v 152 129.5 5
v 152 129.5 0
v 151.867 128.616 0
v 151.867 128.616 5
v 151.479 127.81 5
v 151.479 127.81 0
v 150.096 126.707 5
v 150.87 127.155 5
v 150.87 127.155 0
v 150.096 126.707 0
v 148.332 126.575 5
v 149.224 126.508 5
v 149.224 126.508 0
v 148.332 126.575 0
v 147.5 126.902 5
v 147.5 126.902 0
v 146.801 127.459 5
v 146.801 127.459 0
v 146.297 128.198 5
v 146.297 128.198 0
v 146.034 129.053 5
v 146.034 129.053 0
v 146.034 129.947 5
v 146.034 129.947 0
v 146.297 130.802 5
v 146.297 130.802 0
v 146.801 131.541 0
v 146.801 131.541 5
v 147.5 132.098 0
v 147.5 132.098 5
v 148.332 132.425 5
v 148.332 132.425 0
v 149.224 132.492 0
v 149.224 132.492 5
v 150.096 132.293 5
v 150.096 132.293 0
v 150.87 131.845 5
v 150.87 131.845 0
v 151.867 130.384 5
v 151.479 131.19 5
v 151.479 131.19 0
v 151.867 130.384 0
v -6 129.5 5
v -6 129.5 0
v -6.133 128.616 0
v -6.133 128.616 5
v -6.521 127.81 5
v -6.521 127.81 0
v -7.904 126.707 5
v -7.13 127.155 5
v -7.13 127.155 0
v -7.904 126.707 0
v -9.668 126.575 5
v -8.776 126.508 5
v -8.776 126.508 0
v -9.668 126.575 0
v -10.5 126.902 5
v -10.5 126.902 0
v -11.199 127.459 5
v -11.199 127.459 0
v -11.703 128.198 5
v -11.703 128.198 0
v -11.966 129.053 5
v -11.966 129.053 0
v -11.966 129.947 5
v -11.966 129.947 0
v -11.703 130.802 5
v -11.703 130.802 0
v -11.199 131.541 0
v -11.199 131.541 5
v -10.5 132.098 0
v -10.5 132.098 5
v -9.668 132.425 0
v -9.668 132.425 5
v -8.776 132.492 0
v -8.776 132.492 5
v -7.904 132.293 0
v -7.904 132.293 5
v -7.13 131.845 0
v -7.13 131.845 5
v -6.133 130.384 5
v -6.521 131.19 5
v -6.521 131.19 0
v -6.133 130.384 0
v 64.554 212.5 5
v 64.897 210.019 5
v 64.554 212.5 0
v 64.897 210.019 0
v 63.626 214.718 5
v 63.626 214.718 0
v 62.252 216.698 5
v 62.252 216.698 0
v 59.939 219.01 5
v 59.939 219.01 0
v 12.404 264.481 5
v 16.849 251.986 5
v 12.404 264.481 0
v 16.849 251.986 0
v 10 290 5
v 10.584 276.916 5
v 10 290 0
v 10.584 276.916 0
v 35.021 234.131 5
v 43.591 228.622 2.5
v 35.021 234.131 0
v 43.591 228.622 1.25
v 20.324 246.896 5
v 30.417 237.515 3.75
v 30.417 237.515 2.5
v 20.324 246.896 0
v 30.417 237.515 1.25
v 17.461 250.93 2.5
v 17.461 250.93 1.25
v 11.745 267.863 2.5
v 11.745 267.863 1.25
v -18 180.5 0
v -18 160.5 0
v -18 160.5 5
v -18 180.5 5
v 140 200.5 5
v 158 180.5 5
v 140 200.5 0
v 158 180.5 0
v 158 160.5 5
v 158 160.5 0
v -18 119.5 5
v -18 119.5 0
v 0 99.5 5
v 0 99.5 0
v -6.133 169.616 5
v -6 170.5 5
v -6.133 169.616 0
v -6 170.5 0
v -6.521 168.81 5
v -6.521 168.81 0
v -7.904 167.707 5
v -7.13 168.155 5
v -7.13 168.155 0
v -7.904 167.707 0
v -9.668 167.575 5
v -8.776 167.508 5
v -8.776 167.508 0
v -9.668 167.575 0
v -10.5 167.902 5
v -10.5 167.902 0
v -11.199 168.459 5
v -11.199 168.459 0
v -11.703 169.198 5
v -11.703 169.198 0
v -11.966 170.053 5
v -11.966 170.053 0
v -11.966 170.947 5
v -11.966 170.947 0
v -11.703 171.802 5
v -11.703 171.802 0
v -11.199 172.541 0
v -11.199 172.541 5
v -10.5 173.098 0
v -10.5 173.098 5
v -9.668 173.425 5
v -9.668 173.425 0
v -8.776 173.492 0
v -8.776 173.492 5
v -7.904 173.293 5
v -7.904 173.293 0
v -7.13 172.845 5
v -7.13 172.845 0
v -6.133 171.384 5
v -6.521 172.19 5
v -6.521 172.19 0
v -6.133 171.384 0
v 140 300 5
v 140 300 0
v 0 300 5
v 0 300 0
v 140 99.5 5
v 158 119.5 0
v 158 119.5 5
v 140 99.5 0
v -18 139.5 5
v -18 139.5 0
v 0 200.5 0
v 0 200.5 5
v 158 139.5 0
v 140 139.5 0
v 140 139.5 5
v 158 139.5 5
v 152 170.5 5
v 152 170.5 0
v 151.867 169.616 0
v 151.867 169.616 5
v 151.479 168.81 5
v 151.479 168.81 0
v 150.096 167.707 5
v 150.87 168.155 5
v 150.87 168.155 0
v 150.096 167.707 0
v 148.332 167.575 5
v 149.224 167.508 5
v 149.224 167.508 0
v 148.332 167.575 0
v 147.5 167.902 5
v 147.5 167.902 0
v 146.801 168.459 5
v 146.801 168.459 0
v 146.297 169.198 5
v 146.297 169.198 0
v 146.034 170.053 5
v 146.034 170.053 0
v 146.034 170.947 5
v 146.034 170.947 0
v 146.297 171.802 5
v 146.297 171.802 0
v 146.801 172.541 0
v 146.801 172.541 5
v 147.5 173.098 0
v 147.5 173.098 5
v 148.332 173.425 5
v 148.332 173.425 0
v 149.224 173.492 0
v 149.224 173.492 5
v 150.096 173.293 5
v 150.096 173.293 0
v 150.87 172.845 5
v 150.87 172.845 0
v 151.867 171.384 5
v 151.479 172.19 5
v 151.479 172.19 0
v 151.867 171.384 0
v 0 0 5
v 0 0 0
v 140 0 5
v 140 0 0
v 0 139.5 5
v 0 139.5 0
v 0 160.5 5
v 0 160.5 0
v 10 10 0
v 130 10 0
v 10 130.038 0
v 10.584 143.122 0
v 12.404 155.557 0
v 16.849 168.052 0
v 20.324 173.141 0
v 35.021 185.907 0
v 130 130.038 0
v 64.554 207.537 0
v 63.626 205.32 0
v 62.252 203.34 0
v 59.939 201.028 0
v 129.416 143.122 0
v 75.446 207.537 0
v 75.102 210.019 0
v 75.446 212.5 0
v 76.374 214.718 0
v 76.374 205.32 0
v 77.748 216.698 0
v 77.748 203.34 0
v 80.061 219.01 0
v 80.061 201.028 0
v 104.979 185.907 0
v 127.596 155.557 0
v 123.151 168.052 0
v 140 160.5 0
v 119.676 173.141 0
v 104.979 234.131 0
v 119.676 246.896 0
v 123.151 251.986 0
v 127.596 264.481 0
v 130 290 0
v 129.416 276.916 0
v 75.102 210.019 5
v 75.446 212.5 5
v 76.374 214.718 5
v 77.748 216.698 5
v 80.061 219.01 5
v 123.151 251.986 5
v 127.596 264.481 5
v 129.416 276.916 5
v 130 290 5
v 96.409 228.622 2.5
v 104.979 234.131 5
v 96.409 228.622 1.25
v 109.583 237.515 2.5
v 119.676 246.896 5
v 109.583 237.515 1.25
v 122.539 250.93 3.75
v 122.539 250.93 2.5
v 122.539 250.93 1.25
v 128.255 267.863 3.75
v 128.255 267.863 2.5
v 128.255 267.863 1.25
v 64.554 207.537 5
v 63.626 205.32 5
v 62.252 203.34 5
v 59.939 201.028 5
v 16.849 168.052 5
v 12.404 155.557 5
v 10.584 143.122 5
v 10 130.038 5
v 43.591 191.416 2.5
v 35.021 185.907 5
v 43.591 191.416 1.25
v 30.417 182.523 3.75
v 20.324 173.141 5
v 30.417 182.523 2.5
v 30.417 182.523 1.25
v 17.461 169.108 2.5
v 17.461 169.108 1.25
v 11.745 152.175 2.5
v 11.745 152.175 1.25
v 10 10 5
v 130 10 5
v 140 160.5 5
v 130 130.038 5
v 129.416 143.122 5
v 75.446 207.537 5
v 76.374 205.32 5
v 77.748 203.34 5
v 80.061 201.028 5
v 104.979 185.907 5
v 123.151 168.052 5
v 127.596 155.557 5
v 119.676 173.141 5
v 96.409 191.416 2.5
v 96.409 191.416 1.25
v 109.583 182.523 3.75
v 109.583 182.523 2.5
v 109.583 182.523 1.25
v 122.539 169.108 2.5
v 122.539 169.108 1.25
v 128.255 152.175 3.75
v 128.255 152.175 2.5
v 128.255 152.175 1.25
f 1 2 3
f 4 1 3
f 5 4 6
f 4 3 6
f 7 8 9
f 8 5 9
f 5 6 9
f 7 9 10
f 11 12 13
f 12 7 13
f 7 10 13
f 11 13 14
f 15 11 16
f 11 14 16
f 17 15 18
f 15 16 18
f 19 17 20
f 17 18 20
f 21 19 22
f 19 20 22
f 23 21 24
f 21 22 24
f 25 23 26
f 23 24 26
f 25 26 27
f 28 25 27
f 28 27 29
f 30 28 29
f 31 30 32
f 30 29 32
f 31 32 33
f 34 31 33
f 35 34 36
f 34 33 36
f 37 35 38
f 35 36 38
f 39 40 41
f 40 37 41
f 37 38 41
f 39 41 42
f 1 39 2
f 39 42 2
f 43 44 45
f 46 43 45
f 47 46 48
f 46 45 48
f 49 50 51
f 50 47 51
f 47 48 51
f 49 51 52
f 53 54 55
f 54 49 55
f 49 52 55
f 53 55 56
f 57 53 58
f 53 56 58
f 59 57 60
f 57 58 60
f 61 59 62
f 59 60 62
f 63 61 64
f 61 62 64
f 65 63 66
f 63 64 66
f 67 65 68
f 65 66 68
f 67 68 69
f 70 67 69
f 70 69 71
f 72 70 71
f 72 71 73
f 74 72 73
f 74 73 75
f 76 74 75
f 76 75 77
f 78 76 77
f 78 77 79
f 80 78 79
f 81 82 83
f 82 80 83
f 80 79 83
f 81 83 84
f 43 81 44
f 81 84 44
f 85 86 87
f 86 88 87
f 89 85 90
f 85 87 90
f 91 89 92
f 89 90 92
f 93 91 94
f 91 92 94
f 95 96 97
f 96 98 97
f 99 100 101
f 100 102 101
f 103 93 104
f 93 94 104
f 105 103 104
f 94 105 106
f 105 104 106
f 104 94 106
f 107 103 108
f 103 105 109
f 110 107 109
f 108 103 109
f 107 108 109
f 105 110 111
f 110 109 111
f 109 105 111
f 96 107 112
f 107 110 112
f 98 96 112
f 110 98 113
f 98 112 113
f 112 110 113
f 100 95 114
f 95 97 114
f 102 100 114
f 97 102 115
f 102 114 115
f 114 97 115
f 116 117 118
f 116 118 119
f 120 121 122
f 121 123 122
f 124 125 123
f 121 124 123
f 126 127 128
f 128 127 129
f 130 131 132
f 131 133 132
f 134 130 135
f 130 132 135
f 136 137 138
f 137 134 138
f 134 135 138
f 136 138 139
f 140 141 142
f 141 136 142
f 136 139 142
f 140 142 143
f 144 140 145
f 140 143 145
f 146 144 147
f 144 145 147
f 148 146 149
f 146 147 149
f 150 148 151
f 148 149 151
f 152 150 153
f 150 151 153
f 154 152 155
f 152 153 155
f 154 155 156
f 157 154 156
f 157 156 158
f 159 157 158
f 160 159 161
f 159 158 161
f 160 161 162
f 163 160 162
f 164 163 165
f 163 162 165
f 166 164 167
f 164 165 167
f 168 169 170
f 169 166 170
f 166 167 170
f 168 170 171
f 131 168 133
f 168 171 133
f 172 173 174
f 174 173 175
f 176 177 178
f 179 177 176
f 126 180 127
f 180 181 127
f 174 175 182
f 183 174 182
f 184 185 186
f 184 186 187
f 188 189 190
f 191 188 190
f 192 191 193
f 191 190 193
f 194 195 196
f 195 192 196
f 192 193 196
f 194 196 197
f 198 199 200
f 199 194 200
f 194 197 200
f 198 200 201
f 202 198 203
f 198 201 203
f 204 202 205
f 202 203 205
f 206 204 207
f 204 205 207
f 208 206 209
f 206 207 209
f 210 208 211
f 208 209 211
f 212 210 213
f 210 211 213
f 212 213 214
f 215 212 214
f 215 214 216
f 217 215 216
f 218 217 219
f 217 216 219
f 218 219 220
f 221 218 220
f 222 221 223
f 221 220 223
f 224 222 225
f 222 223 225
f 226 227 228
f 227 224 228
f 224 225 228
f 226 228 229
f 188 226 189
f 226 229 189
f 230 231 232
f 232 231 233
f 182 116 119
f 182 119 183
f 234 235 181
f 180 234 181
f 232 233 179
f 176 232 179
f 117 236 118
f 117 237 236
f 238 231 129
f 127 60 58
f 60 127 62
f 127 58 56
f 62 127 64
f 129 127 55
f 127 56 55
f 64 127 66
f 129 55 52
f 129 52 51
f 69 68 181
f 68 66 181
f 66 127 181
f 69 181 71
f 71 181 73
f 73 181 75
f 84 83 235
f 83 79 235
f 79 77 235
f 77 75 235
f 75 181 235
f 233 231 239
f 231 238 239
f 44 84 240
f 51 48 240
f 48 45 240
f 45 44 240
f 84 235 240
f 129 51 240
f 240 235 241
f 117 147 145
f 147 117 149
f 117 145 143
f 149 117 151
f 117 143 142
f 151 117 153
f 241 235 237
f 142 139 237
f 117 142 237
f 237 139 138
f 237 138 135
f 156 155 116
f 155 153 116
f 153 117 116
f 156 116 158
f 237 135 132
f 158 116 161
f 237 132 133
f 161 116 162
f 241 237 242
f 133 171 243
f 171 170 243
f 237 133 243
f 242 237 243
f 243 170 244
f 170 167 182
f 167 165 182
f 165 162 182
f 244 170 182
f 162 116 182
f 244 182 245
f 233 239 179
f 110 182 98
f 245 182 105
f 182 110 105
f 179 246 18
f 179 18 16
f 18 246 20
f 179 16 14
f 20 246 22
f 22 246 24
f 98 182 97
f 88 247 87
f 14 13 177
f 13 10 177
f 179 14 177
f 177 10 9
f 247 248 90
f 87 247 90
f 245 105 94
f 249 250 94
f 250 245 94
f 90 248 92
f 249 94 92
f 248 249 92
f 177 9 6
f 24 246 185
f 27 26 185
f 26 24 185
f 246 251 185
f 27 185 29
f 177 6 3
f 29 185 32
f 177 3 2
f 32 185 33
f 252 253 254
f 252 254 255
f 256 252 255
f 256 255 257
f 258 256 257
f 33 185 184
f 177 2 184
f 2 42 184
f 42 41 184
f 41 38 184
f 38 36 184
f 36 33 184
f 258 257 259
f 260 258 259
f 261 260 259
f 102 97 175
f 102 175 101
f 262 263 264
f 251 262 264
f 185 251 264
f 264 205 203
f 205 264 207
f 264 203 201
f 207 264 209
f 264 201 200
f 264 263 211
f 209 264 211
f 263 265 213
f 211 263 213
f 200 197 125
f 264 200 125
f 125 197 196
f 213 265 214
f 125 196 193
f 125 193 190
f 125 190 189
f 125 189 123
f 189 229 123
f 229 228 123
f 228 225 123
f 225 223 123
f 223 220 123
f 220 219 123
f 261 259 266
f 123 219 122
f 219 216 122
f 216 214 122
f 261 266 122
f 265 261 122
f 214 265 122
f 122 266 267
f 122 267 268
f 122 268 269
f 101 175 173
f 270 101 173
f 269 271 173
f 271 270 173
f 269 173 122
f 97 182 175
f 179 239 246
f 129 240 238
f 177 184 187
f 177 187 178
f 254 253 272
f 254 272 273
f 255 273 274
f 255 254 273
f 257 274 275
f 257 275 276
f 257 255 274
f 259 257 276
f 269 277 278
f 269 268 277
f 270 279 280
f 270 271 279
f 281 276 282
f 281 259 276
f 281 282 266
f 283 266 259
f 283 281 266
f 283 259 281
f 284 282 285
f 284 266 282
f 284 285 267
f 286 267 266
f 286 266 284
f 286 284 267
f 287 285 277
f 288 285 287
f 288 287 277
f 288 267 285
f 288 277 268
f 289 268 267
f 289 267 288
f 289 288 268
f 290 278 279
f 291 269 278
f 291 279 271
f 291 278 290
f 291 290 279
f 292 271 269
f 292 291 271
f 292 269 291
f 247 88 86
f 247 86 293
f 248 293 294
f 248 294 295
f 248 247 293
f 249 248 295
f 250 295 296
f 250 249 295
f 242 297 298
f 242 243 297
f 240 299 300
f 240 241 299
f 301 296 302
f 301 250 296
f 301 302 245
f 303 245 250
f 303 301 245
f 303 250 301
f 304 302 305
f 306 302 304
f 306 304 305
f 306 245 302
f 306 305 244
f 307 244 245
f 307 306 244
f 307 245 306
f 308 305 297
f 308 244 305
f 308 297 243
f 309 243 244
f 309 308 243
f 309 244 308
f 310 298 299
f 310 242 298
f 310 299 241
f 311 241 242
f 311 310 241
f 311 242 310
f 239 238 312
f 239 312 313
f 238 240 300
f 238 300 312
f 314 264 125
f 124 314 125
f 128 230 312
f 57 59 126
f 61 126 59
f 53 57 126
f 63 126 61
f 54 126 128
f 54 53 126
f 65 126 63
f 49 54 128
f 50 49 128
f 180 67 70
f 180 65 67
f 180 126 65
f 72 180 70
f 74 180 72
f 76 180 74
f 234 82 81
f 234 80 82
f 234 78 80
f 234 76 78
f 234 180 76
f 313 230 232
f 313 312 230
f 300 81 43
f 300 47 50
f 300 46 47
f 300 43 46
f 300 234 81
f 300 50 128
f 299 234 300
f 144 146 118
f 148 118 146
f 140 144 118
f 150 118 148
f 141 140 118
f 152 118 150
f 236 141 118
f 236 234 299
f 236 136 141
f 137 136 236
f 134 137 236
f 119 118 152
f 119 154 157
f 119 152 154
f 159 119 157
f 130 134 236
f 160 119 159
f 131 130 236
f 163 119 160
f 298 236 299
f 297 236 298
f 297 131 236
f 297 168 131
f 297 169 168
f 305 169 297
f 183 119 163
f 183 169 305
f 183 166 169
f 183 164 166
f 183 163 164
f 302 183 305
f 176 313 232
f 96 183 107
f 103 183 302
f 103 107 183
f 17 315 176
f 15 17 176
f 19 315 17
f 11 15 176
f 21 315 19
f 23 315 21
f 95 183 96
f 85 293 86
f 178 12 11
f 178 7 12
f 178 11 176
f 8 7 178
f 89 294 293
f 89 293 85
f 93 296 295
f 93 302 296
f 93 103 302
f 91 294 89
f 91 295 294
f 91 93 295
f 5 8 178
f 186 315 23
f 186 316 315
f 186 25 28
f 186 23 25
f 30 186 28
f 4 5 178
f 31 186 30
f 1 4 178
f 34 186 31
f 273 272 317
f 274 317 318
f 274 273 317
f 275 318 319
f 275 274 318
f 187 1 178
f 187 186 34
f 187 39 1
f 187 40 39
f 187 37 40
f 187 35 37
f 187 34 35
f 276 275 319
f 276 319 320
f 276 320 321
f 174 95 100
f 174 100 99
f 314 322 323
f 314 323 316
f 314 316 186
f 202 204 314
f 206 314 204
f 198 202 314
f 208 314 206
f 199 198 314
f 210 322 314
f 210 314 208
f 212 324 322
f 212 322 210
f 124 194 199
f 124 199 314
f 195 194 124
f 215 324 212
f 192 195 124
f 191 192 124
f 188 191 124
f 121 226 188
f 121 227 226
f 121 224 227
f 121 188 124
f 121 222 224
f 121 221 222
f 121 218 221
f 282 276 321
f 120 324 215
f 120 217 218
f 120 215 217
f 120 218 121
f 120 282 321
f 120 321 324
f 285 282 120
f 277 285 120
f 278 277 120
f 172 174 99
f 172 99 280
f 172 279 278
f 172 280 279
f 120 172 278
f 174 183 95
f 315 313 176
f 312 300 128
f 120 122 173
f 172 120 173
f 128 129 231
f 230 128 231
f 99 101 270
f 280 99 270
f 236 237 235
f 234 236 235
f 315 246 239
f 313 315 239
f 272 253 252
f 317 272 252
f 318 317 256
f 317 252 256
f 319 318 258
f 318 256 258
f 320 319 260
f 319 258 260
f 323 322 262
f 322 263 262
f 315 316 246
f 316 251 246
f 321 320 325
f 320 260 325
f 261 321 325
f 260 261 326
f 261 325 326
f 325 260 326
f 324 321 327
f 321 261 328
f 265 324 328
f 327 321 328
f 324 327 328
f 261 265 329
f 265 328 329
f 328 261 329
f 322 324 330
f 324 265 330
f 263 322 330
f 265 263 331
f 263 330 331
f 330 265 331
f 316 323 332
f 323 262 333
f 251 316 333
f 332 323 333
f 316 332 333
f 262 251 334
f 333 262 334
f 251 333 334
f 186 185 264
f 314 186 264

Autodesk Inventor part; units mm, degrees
ref_plane "YZ Plane" through (0, 0, 0) normal (1, 0, 0) x (0, 1, 0)
ref_plane "XZ Plane" through (0, 0, 0) normal (0, 1, 0) x (-1, 0, 0)
ref_plane "XY Plane" through (0, 0, 0) normal (0, 0, 1) x (1, 0, 0)
sketch "Sketch1" plane through (0, 0, 0) normal (0, 0, 1) x (1, 0, 0)
  line L0 (0, 0) -> (140, 0)
  line L1 (140, 0) -> (140, 300)
  line L2 (140, 300) -> (0, 300)
  line L3 (0, 300) -> (0, 0)
  line L4 (10, 290) -> (130, 290)
  line L5 (130, 290) -> (130, 10) construction
  line L6 (130, 10) -> (10, 10) construction
  line L7 (10, 10) -> (10, 290) construction
  line L8 (55.013, 210.0189) -> (44.1329, 210.0189) construction
  line L9 (10, 290) -> (130, 290) construction
  line L10 (70, 311.1686) -> (70, 319.6965) construction
  line L11 (64.8975, 210.0189) -> (64.8975, 204.1374) construction
  line L12 (75.1025, 210.0189) -> (75.1025, 204.1374) construction
  spline S0 degree 4 poles (64.8975, 210.0189) (64.8975, 218.5538) (47.6053, 225.9043) (40.8111, 229.8746) (18.3339, 245.7556) (11.7937, 258.2232) (10, 279.3922) (10, 290) knots 0 0 0 0 0 0.284812 0.471394 0.66948 1 1 1 1 1
  line L13 (10, 290) -> (10, 266.9306) construction
  spline S1 degree 4 poles (75.1025, 210.0189) (75.1025, 218.5538) (92.3947, 225.9043) (99.1889, 229.8746) (121.6661, 245.7556) (128.2063, 258.2232) (130, 279.3922) (130, 290) knots 0 0 0 0 0 0.284812 0.471394 0.66948 1 1 1 1 1
  spline S2 degree 4 poles (64.8975, 210.0189) (64.8975, 201.4839) (47.6053, 194.1334) (40.8111, 190.1632) (18.3339, 174.2821) (11.7937, 161.8145) (10, 140.6455) (10, 130.0377) knots 0 0 0 0 0 0.284812 0.471394 0.66948 1 1 1 1 1
  spline S3 degree 4 poles (75.1025, 210.0189) (75.1025, 201.4839) (92.3947, 194.1334) (99.1889, 190.1632) (121.6661, 174.2821) (128.2063, 161.8145) (130, 140.6455) (130, 130.0377) knots 0 0 0 0 0 0.284812 0.471394 0.66948 1 1 1 1 1
  line L14 (10, 130.0377) -> (10, 10)
  line L15 (130, 130.0377) -> (130, 10)
  line L16 (10, 10) -> (130, 10)
  line L17 (240, 186.8124) -> (240, 163.5372) construction
  line L18 (480, 0) -> (340, 0) construction
  line L19 (340, 0) -> (340, 300) construction
  line L20 (340, 300) -> (480, 300) construction
  line L21 (480, 300) -> (480, 0) construction
  line L22 (470, 290) -> (350, 290) construction
  line L23 (350, 290) -> (350, 10) construction
  line L24 (350, 10) -> (470, 10) construction
  line L25 (470, 10) -> (470, 290) construction
  line L26 (424.987, 210.0189) -> (435.8671, 210.0189) construction
  line L27 (470, 290) -> (350, 290) construction
  line L28 (410, 311.1686) -> (410, 319.6965) construction
  line L29 (415.1025, 210.0189) -> (415.1025, 204.1374) construction
  line L30 (404.8975, 210.0189) -> (404.8975, 204.1374) construction
  spline S4 degree 4 poles (415.1025, 210.0189) (415.1025, 218.5538) (432.3947, 225.9043) (439.1889, 229.8746) (461.6661, 245.7556) (468.2063, 258.2232) (470, 279.3922) (470, 290) knots 0 0 0 0 0 0.284812 0.471394 0.66948 1 1 1 1 1 construction
  line L31 (470, 290) -> (470, 266.9306) construction
  spline S5 degree 4 poles (404.8975, 210.0189) (394.814, 224.8509) (381.6315, 227.4313) (352.9317, 245.1456) (350.4567, 267.2032) (350, 290) knots 0 0 0 0 0 0.471394 1 1 1 1 1 construction
  spline S6 degree 4 poles (415.1025, 210.0189) (425.186, 195.1868) (438.3685, 192.6065) (467.0683, 174.8921) (469.5433, 152.8345) (470, 130.0377) knots 0 0 0 0 0 0.471394 1 1 1 1 1 construction
  spline S7 degree 4 poles (404.8975, 210.0189) (394.814, 195.1868) (381.6315, 192.6065) (352.9317, 174.8921) (350.4567, 152.8345) (350, 130.0377) knots 0 0 0 0 0 0.471394 1 1 1 1 1 construction
  line L32 (355, 14.5) -> (355, 130.0377)
  line L33 (355, 130.0377) -> (357, 130.0377)
  line L34 (357, 130.0377) -> (357, 14.5)
  arc A0 (353.5, 13) -> (355, 14.5) centre (353.5, 14.5) ccw
  arc A1 (351, 14.5) -> (352.5, 13) centre (352.5, 14.5) ccw construction
  line L35 (352.5, 13) -> (353.5, 13)
  arc A2 (357, 14.5) -> (358.5, 13) centre (358.5, 14.5) ccw
  line L36 (358.5, 13) -> (359.5, 13)
  line L37 (361, 14.5) -> (361, 130.0377)
  line L38 (363, 130.0377) -> (363, 14.5)
  arc A3 (359.5, 13) -> (361, 14.5) centre (359.5, 14.5) ccw
  line L39 (361, 130.0377) -> (363, 130.0377)
  arc A4 (363, 14.5) -> (364.5, 13) centre (364.5, 14.5) ccw
  line L40 (364.5, 13) -> (365.5, 13)
  line L41 (367, 14.5) -> (367, 130.0377)
  line L42 (369, 130.0377) -> (369, 14.5)
  arc A5 (365.5, 13) -> (367, 14.5) centre (365.5, 14.5) ccw
  line L43 (367, 130.0377) -> (369, 130.0377)
  arc A6 (369, 14.5) -> (370.5, 13) centre (370.5, 14.5) ccw
  line L44 (370.5, 13) -> (371.5, 13)
  line L45 (373, 14.5) -> (373, 130.0377)
  line L46 (375, 130.0377) -> (375, 14.5)
  arc A7 (371.5, 13) -> (373, 14.5) centre (371.5, 14.5) ccw
  line L47 (373, 130.0377) -> (375, 130.0377)
  arc A8 (375, 14.5) -> (376.5, 13) centre (376.5, 14.5) ccw
  line L48 (376.5, 13) -> (377.5, 13)
  line L49 (379, 14.5) -> (379, 130.0377)
  line L50 (381, 130.0377) -> (381, 14.5)
  arc A9 (377.5, 13) -> (379, 14.5) centre (377.5, 14.5) ccw
  line L51 (379, 130.0377) -> (381, 130.0377)
  arc A10 (381, 14.5) -> (382.5, 13) centre (382.5, 14.5) ccw
  line L52 (382.5, 13) -> (383.5, 13)
  line L53 (385, 14.5) -> (385, 130.0377)
  line L54 (387, 130.0377) -> (387, 14.5)
  arc A11 (383.5, 13) -> (385, 14.5) centre (383.5, 14.5) ccw
  line L55 (385, 130.0377) -> (387, 130.0377)
  arc A12 (387, 14.5) -> (388.5, 13) centre (388.5, 14.5) ccw
  line L56 (388.5, 13) -> (389.5, 13)
  line L57 (391, 14.5) -> (391, 130.0377)
  line L58 (393, 130.0377) -> (393, 14.5)
  arc A13 (389.5, 13) -> (391, 14.5) centre (389.5, 14.5) ccw
  line L59 (391, 130.0377) -> (393, 130.0377)
  arc A14 (393, 14.5) -> (394.5, 13) centre (394.5, 14.5) ccw
  line L60 (394.5, 13) -> (395.5, 13)
  line L61 (397, 14.5) -> (397, 130.0377)
  line L62 (399, 130.0377) -> (399, 14.5)
  arc A15 (395.5, 13) -> (397, 14.5) centre (395.5, 14.5) ccw
  line L63 (397, 130.0377) -> (399, 130.0377)
  arc A16 (399, 14.5) -> (400.5, 13) centre (400.5, 14.5) ccw
  line L64 (400.5, 13) -> (401.5, 13)
  line L65 (403, 14.5) -> (403, 130.0377)
  line L66 (405, 130.0377) -> (405, 14.5)
  arc A17 (401.5, 13) -> (403, 14.5) centre (401.5, 14.5) ccw
  line L67 (403, 130.0377) -> (405, 130.0377)
  arc A18 (405, 14.5) -> (406.5, 13) centre (406.5, 14.5) ccw
  line L68 (406.5, 13) -> (407.5, 13)
  line L69 (409, 14.5) -> (409, 130.0377)
  line L70 (411, 130.0377) -> (411, 14.5)
  arc A19 (407.5, 13) -> (409, 14.5) centre (407.5, 14.5) ccw
  line L71 (409, 130.0377) -> (411, 130.0377)
  arc A20 (411, 14.5) -> (412.5, 13) centre (412.5, 14.5) ccw
  line L72 (412.5, 13) -> (413.5, 13)
  line L73 (415, 14.5) -> (415, 130.0377)
  line L74 (417, 130.0377) -> (417, 14.5)
  arc A21 (413.5, 13) -> (415, 14.5) centre (413.5, 14.5) ccw
  line L75 (415, 130.0377) -> (417, 130.0377)
  arc A22 (417, 14.5) -> (418.5, 13) centre (418.5, 14.5) ccw
  line L76 (418.5, 13) -> (419.5, 13)
  line L77 (421, 14.5) -> (421, 130.0377)
  line L78 (423, 130.0377) -> (423, 14.5)
  arc A23 (419.5, 13) -> (421, 14.5) centre (419.5, 14.5) ccw
  line L79 (421, 130.0377) -> (423, 130.0377)
  arc A24 (423, 14.5) -> (424.5, 13) centre (424.5, 14.5) ccw
  line L80 (424.5, 13) -> (425.5, 13)
  line L81 (427, 14.5) -> (427, 130.0377)
  line L82 (429, 130.0377) -> (429, 14.5)
  arc A25 (425.5, 13) -> (427, 14.5) centre (425.5, 14.5) ccw
  line L83 (427, 130.0377) -> (429, 130.0377)
  arc A26 (429, 14.5) -> (430.5, 13) centre (430.5, 14.5) ccw
  line L84 (430.5, 13) -> (431.5, 13)
  line L85 (433, 14.5) -> (433, 130.0377)
  line L86 (435, 130.0377) -> (435, 14.5)
  arc A27 (431.5, 13) -> (433, 14.5) centre (431.5, 14.5) ccw
  line L87 (433, 130.0377) -> (435, 130.0377)
  arc A28 (435, 14.5) -> (436.5, 13) centre (436.5, 14.5) ccw
  line L88 (436.5, 13) -> (437.5, 13)
  line L89 (439, 14.5) -> (439, 130.0377)
  line L90 (441, 130.0377) -> (441, 14.5)
  arc A29 (437.5, 13) -> (439, 14.5) centre (437.5, 14.5) ccw
  line L91 (439, 130.0377) -> (441, 130.0377)
  arc A30 (441, 14.5) -> (442.5, 13) centre (442.5, 14.5) ccw
  line L92 (442.5, 13) -> (443.5, 13)
  line L93 (445, 14.5) -> (445, 130.0377)
  line L94 (447, 130.0377) -> (447, 14.5)
  arc A31 (443.5, 13) -> (445, 14.5) centre (443.5, 14.5) ccw
  line L95 (445, 130.0377) -> (447, 130.0377)
  arc A32 (447, 14.5) -> (448.5, 13) centre (448.5, 14.5) ccw
  line L96 (448.5, 13) -> (449.5, 13)
  line L97 (451, 14.5) -> (451, 130.0377)
  line L98 (453, 130.0377) -> (453, 14.5)
  arc A33 (449.5, 13) -> (451, 14.5) centre (449.5, 14.5) ccw
  line L99 (451, 130.0377) -> (453, 130.0377)
  arc A34 (453, 14.5) -> (454.5, 13) centre (454.5, 14.5) ccw
  line L100 (454.5, 13) -> (455.5, 13)
  line L101 (457, 14.5) -> (457, 130.0377)
  line L102 (459, 130.0377) -> (459, 14.5)
  arc A35 (455.5, 13) -> (457, 14.5) centre (455.5, 14.5) ccw
  line L103 (457, 130.0377) -> (459, 130.0377)
  arc A36 (459, 14.5) -> (460.5, 13) centre (460.5, 14.5) ccw
  line L104 (460.5, 13) -> (461.5, 13)
  line L105 (463, 14.5) -> (463, 130.0377)
  line L106 (465, 130.0377) -> (465, 14.5)
  arc A37 (461.5, 13) -> (463, 14.5) centre (461.5, 14.5) ccw
  line L107 (463, 130.0377) -> (465, 130.0377)
  arc A38 (465, 14.5) -> (466.5, 13) centre (466.5, 14.5) ccw
  line L108 (466.5, 13) -> (470, 13)
  line L109 (470, 10) -> (470, 13)
  line L110 (470, 10) -> (350, 10)
  line L111 (350, 10) -> (350, 13)
  line L112 (352.5, 13) -> (350, 13)
  line L113 (740, 300) -> (600, 300)
  line L114 (610, 290) -> (730, 290) construction
  line L115 (610, 290) -> (730, 290) construction
  spline S8 degree 4 poles (675.1025, 210.0189) (675.1025, 218.5538) (692.3947, 225.9043) (699.1889, 229.8746) (721.6661, 245.7556) (728.2063, 258.2232) (730, 279.3922) (730, 290) knots 0 0 0 0 0 0.284812 0.471394 0.66948 1 1 1 1 1 construction
  line L116 (664.8975, 210.0189) -> (664.8975, 204.1374) construction
  line L117 (610, 290) -> (610, 266.9306) construction
  spline S9 degree 4 poles (664.8975, 210.0189) (664.8975, 218.5538) (647.6053, 225.9043) (640.8111, 229.8746) (618.3339, 245.7556) (611.7937, 258.2232) (610, 279.3922) (610, 290) knots 0 0 0 0 0 0.284812 0.471394 0.66948 1 1 1 1 1 construction
  line L118 (675.1025, 210.0189) -> (675.1025, 204.1374) construction
  spline S10 degree 4 poles (675.1025, 210.0189) (675.1025, 201.4839) (692.3947, 194.1334) (699.1889, 190.1632) (721.6661, 174.2821) (728.2063, 161.8145) (730, 140.6455) (730, 130.0377) knots 0 0 0 0 0 0.284812 0.471394 0.66948 1 1 1 1 1 construction
  spline S11 degree 4 poles (664.8975, 210.0189) (664.8975, 201.4839) (647.6053, 194.1334) (640.8111, 190.1632) (618.3339, 174.2821) (611.7937, 161.8145) (610, 140.6455) (610, 130.0377) knots 0 0 0 0 0 0.284812 0.471394 0.66948 1 1 1 1 1 construction
  line L119 (730, 290) -> (730, 10) construction
  line L120 (610, 10) -> (610, 290) construction
  line L121 (740, 0) -> (740, 300)
  line L122 (600, 300) -> (600, 0)
  line L123 (610, 130.0377) -> (610, 10) construction
  line L124 (730, 10) -> (610, 10) construction
  line L125 (610, 10) -> (730, 10) construction
  line L126 (730, 130.0377) -> (730, 10) construction
  line L127 (600, 0) -> (740, 0)
  circle A39 centre (670, 187.6403) radius 1.45
  line L128 (661.5147, 179.155) -> (670, 187.6403) construction
  line L129 (670, 187.6403) -> (661.5147, 179.155) construction
  line L130 (661.5147, 179.155) -> (678.4853, 179.155) construction
  line L131 (130, 290) -> (130, 293.3347) construction
  line L132 (730, 290) -> (730, 294.5645) construction
  line L133 (670, 187.6403) -> (667.2579, 190.3824) construction
  line L134 (661.5147, 179.155) -> (658.7726, 181.8971) construction
  circle A40 centre (661.5147, 179.155) radius 1.45
  circle A41 centre (653.0294, 170.6697) radius 1.45
  circle A42 centre (644.5442, 162.1844) radius 1.45
  circle A43 centre (636.0589, 153.6991) radius 1.45
  circle A44 centre (627.5736, 145.2139) radius 1.45
  circle A45 centre (619.0883, 136.7286) radius 1.45
  circle A46 centre (619.0883, 153.6991) radius 1.45
  circle A47 centre (627.5736, 162.1844) radius 1.45
  circle A48 centre (636.0589, 170.6697) radius 1.45
  circle A49 centre (644.5442, 179.155) radius 1.45
  circle A50 centre (653.0294, 187.6403) radius 1.45
  circle A51 centre (686.9706, 187.6403) radius 1.45
  circle A52 centre (678.4853, 179.155) radius 1.45
  circle A53 centre (670, 170.6697) radius 1.45
  circle A54 centre (661.5147, 162.1844) radius 1.45
  circle A55 centre (653.0294, 153.6991) radius 1.45
  circle A56 centre (644.5442, 145.2139) radius 1.45
  circle A57 centre (636.0589, 136.7286) radius 1.45
  circle A58 centre (695.4558, 179.155) radius 1.45
  circle A59 centre (686.9706, 170.6697) radius 1.45
  circle A60 centre (670, 170.6697) radius 1.45
  circle A61 centre (661.5147, 162.1844) radius 1.45
  circle A62 centre (678.4853, 162.1844) radius 1.45
  circle A63 centre (653.0294, 153.6991) radius 1.45
  circle A64 centre (670, 153.6991) radius 1.45
  circle A65 centre (661.5147, 145.2139) radius 1.45
  circle A66 centre (644.5442, 145.2139) radius 1.45
  circle A67 centre (636.0589, 136.7286) radius 1.45
  circle A68 centre (653.0294, 136.7286) radius 1.45
  circle A69 centre (695.4558, 162.1844) radius 1.45
  circle A70 centre (686.9706, 153.6991) radius 1.45
  circle A71 centre (678.4853, 145.2139) radius 1.45
  circle A72 centre (670, 136.7286) radius 1.45
  circle A73 centre (712.4264, 162.1844) radius 1.45
  circle A74 centre (703.9411, 153.6991) radius 1.45
  circle A75 centre (695.4558, 145.2139) radius 1.45
  circle A76 centre (686.9706, 136.7286) radius 1.45
  circle A77 centre (703.9411, 170.6697) radius 1.45
  circle A78 centre (720.9117, 153.6991) radius 1.45
  circle A79 centre (712.4264, 145.2139) radius 1.45
  circle A80 centre (703.9411, 136.7286) radius 1.45
  circle A81 centre (720.9117, 136.7286) radius 1.45
  line L135 (0, 160.5) -> (-18, 160.5)
  line L136 (-18, 160.5) -> (-18, 180.5)
  line L137 (-18, 180.5) -> (0, 180.5) construction
  line L138 (0, 180.5) -> (0, 160.5)
  line L139 (-24.3067, 150) -> (-34.4998, 150) construction
  circle A82 centre (-9, 170.5) radius 3
  line L140 (-18, 180.5) -> (0, 200.5)
  line L141 (0, 139.5) -> (-18, 139.5)
  line L142 (-18, 139.5) -> (-18, 119.5)
  circle A83 centre (-9, 129.5) radius 3
  line L143 (-18, 119.5) -> (0, 99.5)
  line L144 (140, 160.5) -> (158, 160.5)
  line L145 (158, 160.5) -> (158, 180.5)
  circle A84 centre (149, 170.5) radius 3
  line L146 (158, 180.5) -> (140, 200.5)
  line L147 (158, 139.5) -> (158, 119.5)
  line L148 (140, 139.5) -> (158, 139.5)
  circle A85 centre (149, 129.5) radius 3
  line L149 (158, 119.5) -> (140, 99.5)
  line L150 (582, 180.5) -> (600, 200.5)
  line L151 (582, 160.5) -> (582, 180.5)
  circle A86 centre (591, 170.5) radius 3
  line L152 (600, 139.5) -> (582, 139.5)
  circle A87 centre (591, 129.5) radius 3
  line L153 (582, 139.5) -> (582, 119.5)
  line L154 (582, 119.5) -> (600, 99.5)
  line L155 (758, 180.5) -> (740, 200.5)
  line L156 (758, 160.5) -> (758, 180.5)
  circle A88 centre (749, 170.5) radius 3
  line L157 (740, 160.5) -> (758, 160.5)
  line L158 (740, 139.5) -> (758, 139.5)
  circle A89 centre (749, 129.5) radius 3
  line L159 (758, 139.5) -> (758, 119.5)
  line L160 (758, 119.5) -> (740, 99.5)
  line L161 (600, 160.5) -> (582, 160.5)
  line L162 (600, 200.5) -> (600, 300)
  line L163 (600, 300) -> (740, 300)
  line L164 (740, 300) -> (740, 200.5)
  line L165 (740, 160.5) -> (740, 139.5)
  line L166 (740, 99.5) -> (740, 0)
  line L167 (740, 0) -> (600, 0)
  line L168 (600, 0) -> (600, 99.5)
  line L169 (600, 139.5) -> (600, 160.5)
  line L170 (780, 153.6991) -> (780, 161.6118) construction
  line L171 (820, 300) -> (960, 300)
  line L172 (960, 0) -> (820, 0)
  line L173 (978, 180.5) -> (960, 200.5)
  line L174 (978, 160.5) -> (978, 180.5)
  circle A90 centre (969, 170.5) radius 3
  line L175 (960, 139.5) -> (978, 139.5)
  circle A91 centre (969, 129.5) radius 3
  line L176 (978, 139.5) -> (978, 119.5)
  line L177 (978, 119.5) -> (960, 99.5)
  line L178 (802, 180.5) -> (820, 200.5)
  line L179 (802, 160.5) -> (802, 180.5)
  circle A92 centre (811, 170.5) radius 3
  line L180 (820, 160.5) -> (802, 160.5)
  line L181 (820, 139.5) -> (802, 139.5)
  circle A93 centre (811, 129.5) radius 3
  line L182 (802, 139.5) -> (802, 119.5)
  line L183 (802, 119.5) -> (820, 99.5)
  line L184 (960, 160.5) -> (978, 160.5)
  line L185 (960, 200.5) -> (960, 300)
  line L186 (960, 300) -> (820, 300)
  line L187 (820, 300) -> (820, 200.5)
  line L188 (820, 160.5) -> (820, 139.5)
  line L189 (820, 99.5) -> (820, 0)
  line L190 (820, 0) -> (960, 0)
  line L191 (960, 0) -> (960, 99.5)
  line L192 (960, 139.5) -> (960, 160.5)
  line L193 (582, -180.5) -> (582, -200.5) construction
  circle A94 centre (591, -190.5) radius 3 construction
  line L194 (600, -159.5) -> (582, -159.5) construction
  line L195 (600, -180.5) -> (582, -180.5) construction
  line L196 (582, -200.5) -> (600, -220.5) construction
  line L197 (582, -139.5) -> (600, -119.5) construction
  line L198 (582, -159.5) -> (582, -139.5) construction
  circle A95 centre (591, -149.5) radius 3 construction
  circle A96 centre (619.0883, -166.3009) radius 1.45 construction
  circle A97 centre (627.5736, -174.7861) radius 1.45 construction
  circle A98 centre (644.5442, -157.8156) radius 1.45 construction
  circle A99 centre (627.5736, -157.8156) radius 1.45 construction
  circle A100 centre (644.5442, -174.7861) radius 1.45 construction
  circle A101 centre (636.0589, -183.2714) radius 1.45 construction
  line L199 (600, -180.5) -> (600, -159.5) construction
  circle A102 centre (636.0589, -183.2714) radius 1.45 construction
  circle A103 centre (644.5442, -174.7861) radius 1.45 construction
  circle A104 centre (619.0883, -183.2714) radius 1.45 construction
  circle A105 centre (636.0589, -166.3009) radius 1.45 construction
  circle A106 centre (653.0294, -183.2714) radius 1.45 construction
  circle A107 centre (661.5147, -174.7861) radius 1.45 construction
  line L200 (664.8975, -109.9811) -> (664.8975, -115.8626) construction
  line L201 (610, -30) -> (610, -53.0694) construction
  spline S12 degree 4 poles (664.8975, -109.9811) (664.8975, -118.5161) (647.6053, -125.8666) (640.8111, -129.8368) (618.3339, -145.7179) (611.7937, -158.1855) (610, -179.3545) (610, -189.9623) knots 0 0 0 0 0 0.284812 0.471394 0.66948 1 1 1 1 1 construction
  circle A108 centre (670, -149.3303) radius 1.45 construction
  circle A109 centre (678.4853, -140.845) radius 1.45 construction
  circle A110 centre (686.9706, -166.3009) radius 1.45 construction
  circle A111 centre (670, -166.3009) radius 1.45 construction
  circle A112 centre (653.0294, -166.3009) radius 1.45 construction
  circle A113 centre (653.0294, -166.3009) radius 1.45 construction
  spline S13 degree 4 poles (664.8975, -109.9811) (664.8975, -101.4462) (647.6053, -94.0957) (640.8111, -90.1254) (618.3339, -74.2444) (611.7937, -61.7768) (610, -40.6078) (610, -30) knots 0 0 0 0 0 0.284812 0.471394 0.66948 1 1 1 1 1 construction
  circle A114 centre (670, -132.3597) radius 1.45 construction
  circle A115 centre (636.0589, -149.3303) radius 1.45 construction
  circle A116 centre (653.0294, -149.3303) radius 1.45 construction
  circle A117 centre (644.5442, -140.845) radius 1.45 construction
  circle A118 centre (653.0294, -132.3597) radius 1.45 construction
  line L202 (661.5147, -140.845) -> (658.7726, -138.1029) construction
  line L203 (661.5147, -140.845) -> (670, -132.3597) construction
  line L204 (670, -132.3597) -> (661.5147, -140.845) construction
  line L205 (670, -132.3597) -> (667.2579, -129.6176) construction
  line L206 (661.5147, -140.845) -> (678.4853, -140.845) construction
  circle A119 centre (686.9706, -132.3597) radius 1.45 construction
  line L207 (600, -119.5) -> (600, -20) construction
  line L208 (600, -20) -> (740, -20) construction
  line L209 (730, -30) -> (730, -25.4355) construction
  line L210 (740, -20) -> (740, -119.5) construction
  circle A120 centre (661.5147, -140.845) radius 1.45 construction
  line L211 (610, -189.9623) -> (610, -310) construction
  line L212 (600, -320) -> (600, -220.5) construction
  line L213 (730, -310) -> (610, -310) construction
  line L214 (610, -310) -> (730, -310) construction
  line L215 (600, -320) -> (740, -320) construction
  line L216 (740, -320) -> (600, -320) construction
  line L217 (730, -189.9623) -> (730, -310) construction
  line L218 (740, -220.5) -> (740, -320) construction
  line L219 (740, -20) -> (600, -20) construction
  line L220 (675.1025, -109.9811) -> (675.1025, -115.8626) construction
  line L221 (610, -30) -> (730, -30) construction
  line L222 (610, -30) -> (730, -30) construction
  spline S14 degree 4 poles (675.1025, -109.9811) (675.1025, -101.4462) (692.3947, -94.0957) (699.1889, -90.1254) (721.6661, -74.2444) (728.2063, -61.7768) (730, -40.6078) (730, -30) knots 0 0 0 0 0 0.284812 0.471394 0.66948 1 1 1 1 1 construction
  line L223 (610, -310) -> (610, -30) construction
  line L224 (600, -20) -> (600, -320) construction
  line L225 (740, -320) -> (740, -20) construction
  line L226 (730, -30) -> (730, -310) construction
  circle A121 centre (678.4853, -174.7861) radius 1.45 construction
  circle A122 centre (670, -183.2714) radius 1.45 construction
  spline S15 degree 4 poles (675.1025, -109.9811) (675.1025, -118.5161) (692.3947, -125.8666) (699.1889, -129.8368) (721.6661, -145.7179) (728.2063, -158.1855) (730, -179.3545) (730, -189.9623) knots 0 0 0 0 0 0.284812 0.471394 0.66948 1 1 1 1 1 construction
  circle A123 centre (686.9706, -183.2714) radius 1.45 construction
  circle A124 centre (670, -149.3303) radius 1.45 construction
  circle A125 centre (661.5147, -157.8156) radius 1.45 construction
  circle A126 centre (695.4558, -140.845) radius 1.45 construction
  circle A127 centre (686.9706, -149.3303) radius 1.45 construction
  circle A128 centre (678.4853, -157.8156) radius 1.45 construction
  circle A129 centre (703.9411, -149.3303) radius 1.45 construction
  line L227 (758, -139.5) -> (740, -119.5) construction
  circle A130 centre (749, -149.5) radius 3 construction
  line L228 (758, -159.5) -> (758, -139.5) construction
  circle A131 centre (661.5147, -157.8156) radius 1.45 construction
  circle A132 centre (703.9411, -183.2714) radius 1.45 construction
  circle A133 centre (712.4264, -174.7861) radius 1.45 construction
  circle A134 centre (720.9117, -183.2714) radius 1.45 construction
  circle A135 centre (695.4558, -174.7861) radius 1.45 construction
  line L229 (740, -159.5) -> (740, -180.5) construction
  line L230 (758, -200.5) -> (740, -220.5) construction
  circle A136 centre (749, -190.5) radius 3 construction
  line L231 (758, -180.5) -> (758, -200.5) construction
  line L232 (740, -180.5) -> (758, -180.5) construction
  line L233 (740, -159.5) -> (758, -159.5) construction
  circle A137 centre (720.9117, -166.3009) radius 1.45 construction
  circle A138 centre (703.9411, -166.3009) radius 1.45 construction
  circle A139 centre (695.4558, -157.8156) radius 1.45 construction
  circle A140 centre (712.4264, -157.8156) radius 1.45 construction
  line L234 (600, -122.3597) -> (740, -122.3597)
  line L235 (740, -122.3597) -> (740, -193.2714)
  line L236 (740, -193.2714) -> (600, -193.2714)
  line L237 (600, -193.2714) -> (600, -122.3597)
  point P0 (70, 290)
  point P1 (70, 300)
  point P2 (10, 150)
  point P3 (0, 150)
  point P4 (70, 290)
  point P5 (70, 315.4325)
  point P6 (49.5729, 210.0189)
  point P7 (49.5729, 225.4245)
  point P8 (37.5413, 232.3974)
  point P9 (24.0774, 242.8841)
  point P10 (14.2457, 257.8533)
  point P11 (90.4271, 225.4245)
  point P12 (102.4587, 232.3974)
  point P13 (115.9226, 242.8841)
  point P14 (125.7543, 257.8533)
  point P15 (49.5729, 194.6132)
  point P16 (37.5413, 187.6403)
  point P17 (24.0774, 177.1536)
  point P18 (14.2457, 162.1844)
  point P19 (90.4271, 194.6132)
  point P20 (102.4587, 187.6403)
  point P21 (115.9226, 177.1536)
  point P22 (125.7543, 162.1844)
  point P23 (410, 290)
  point P24 (410, 300)
  point P25 (470, 150)
  point P26 (480, 150)
  point P27 (410, 290)
  point P28 (410, 315.4325)
  point P29 (430.4271, 210.0189)
  point P30 (430.4271, 225.4245)
  point P31 (442.4587, 232.3974)
  point P32 (455.9226, 242.8841)
  point P33 (465.7543, 257.8533)
  point P34 (389.5729, 225.4245)
  point P35 (377.5413, 232.3974)
  point P36 (364.0774, 242.8841)
  point P37 (354.2457, 257.8533)
  point P38 (430.4271, 194.6132)
  point P39 (442.4587, 187.6403)
  point P40 (455.9226, 177.1536)
  point P41 (465.7543, 162.1844)
  point P42 (389.5729, 194.6132)
  point P43 (377.5413, 187.6403)
  point P44 (364.0774, 177.1536)
  point P45 (354.2457, 162.1844)
  point P46 (356, 130.0377)
  point P47 (362, 130.0377)
  point P48 (368, 130.0377)
  point P49 (374, 130.0377)
  point P50 (380, 130.0377)
  point P51 (386, 130.0377)
  point P52 (392, 130.0377)
  point P53 (398, 130.0377)
  point P54 (404, 130.0377)
  point P55 (410, 130.0377)
  point P56 (416, 130.0377)
  point P57 (422, 130.0377)
  point P58 (428, 130.0377)
  point P59 (434, 130.0377)
  point P60 (440, 130.0377)
  point P61 (446, 130.0377)
  point P62 (452, 130.0377)
  point P63 (458, 130.0377)
  point P64 (464, 130.0377)
  point P65 (410, 130.0377)
  point P66 (410, 315.4325)
  point P67 (670, 300)
  point P68 (670, 290)
  point P69 (670, 290)
  point P70 (690.4271, 225.4245)
  point P71 (702.4587, 232.3974)
  point P72 (715.9226, 242.8841)
  point P73 (725.7543, 257.8533)
  point P74 (649.5729, 225.4245)
  point P75 (637.5413, 232.3974)
  point P76 (624.0774, 242.8841)
  point P77 (614.2457, 257.8533)
  point P78 (690.4271, 194.6132)
  point P79 (649.5729, 194.6132)
  point P80 (702.4587, 187.6403)
  point P81 (637.5413, 187.6403)
  point P82 (715.9226, 177.1536)
  point P83 (624.0774, 177.1536)
  point P84 (614.2457, 162.1844)
  point P85 (725.7543, 162.1844)
  point P86 (610, 150)
  point P87 (600, 150)
  point P88 (670, 179.155)
  point P89 (670, 300)
  point P90 (-29.4032, 150)
  point P91 (-18, 170.5)
  point P92 (-9, 180.5)
  point P93 (582, 170.5)
  point P94 (890, 300)
  point P95 (960, 150)
  point P96 (890, 300)
  point P97 (978, 170.5)
  point P98 (582, -149.5)
  point P99 (600, -170)
  point P100 (670, -30)
  point P101 (670, -30)
  point P102 (670, -20)
  point P103 (637.5413, -132.3597)
  point P104 (624.0774, -142.8464)
  point P105 (614.2457, -157.8156)
  point P106 (649.5729, -125.3868)
  point P107 (610, -170)
  point P108 (670, -140.845)
  point P109 (649.5729, -94.5755)
  point P110 (637.5413, -87.6026)
  point P111 (624.0774, -77.1159)
  point P112 (614.2457, -62.1467)
  point P113 (670, -20)
  point P114 (690.4271, -94.5755)
  point P115 (702.4587, -87.6026)
  point P116 (725.7543, -62.1467)
  point P117 (702.4587, -132.3597)
  point P118 (715.9226, -77.1159)
  point P119 (690.4271, -125.3868)
  point P120 (715.9226, -142.8464)
  point P121 (725.7543, -157.8156)
  point P122 (0, 99.5)
  point P123 (130, 290)
  dimension "d0" = 140
  dimension "d1" = 300
  dimension "d2" = 10
  dimension "d3" = 10
  dimension "d5" = 100
  dimension "d6" = 2
  dimension "d9" = 79.9811
  dimension "d12" = 1.5
  dimension "d13" = 1.5
  dimension "d15" = 4
  dimension "d18" = 6
  dimension "d23" = 3
  dimension "d26" = 600
  dimension "d33" = 2.9
  dimension "d34" = 45
  dimension "d35" = 12
  dimension "d38" = 12
  dimension "d45" = 16.9706
  dimension "d52" = 16.9706
  dimension "d59" = 16.9706
  dimension "d66" = 16.9706
  dimension "d73" = 16.9706
  dimension "d80" = 16.9706
  dimension "d85" = 18
  dimension "d86" = 20
  dimension "d87" = 10.5
  dimension "d88" = 6
  dimension "d89" = 20
  dimension "d92" = 600
  dimension "d97" = 10.2051
  dimension "d98" = 40
  dimension "d101" = 320
  dimension "d106" = 10
  dimension "d107" = 10
extrude "Extrusion1" add sketch "Sketch1" along normal blind 5 contours L3 L2 L1 L0 | L143 L142 L141 L3 | L1 L148 L147 L149 | L135 L136 L140 L3 | L1 L146 L145 L144
properties part number "SGB-2-middle"
